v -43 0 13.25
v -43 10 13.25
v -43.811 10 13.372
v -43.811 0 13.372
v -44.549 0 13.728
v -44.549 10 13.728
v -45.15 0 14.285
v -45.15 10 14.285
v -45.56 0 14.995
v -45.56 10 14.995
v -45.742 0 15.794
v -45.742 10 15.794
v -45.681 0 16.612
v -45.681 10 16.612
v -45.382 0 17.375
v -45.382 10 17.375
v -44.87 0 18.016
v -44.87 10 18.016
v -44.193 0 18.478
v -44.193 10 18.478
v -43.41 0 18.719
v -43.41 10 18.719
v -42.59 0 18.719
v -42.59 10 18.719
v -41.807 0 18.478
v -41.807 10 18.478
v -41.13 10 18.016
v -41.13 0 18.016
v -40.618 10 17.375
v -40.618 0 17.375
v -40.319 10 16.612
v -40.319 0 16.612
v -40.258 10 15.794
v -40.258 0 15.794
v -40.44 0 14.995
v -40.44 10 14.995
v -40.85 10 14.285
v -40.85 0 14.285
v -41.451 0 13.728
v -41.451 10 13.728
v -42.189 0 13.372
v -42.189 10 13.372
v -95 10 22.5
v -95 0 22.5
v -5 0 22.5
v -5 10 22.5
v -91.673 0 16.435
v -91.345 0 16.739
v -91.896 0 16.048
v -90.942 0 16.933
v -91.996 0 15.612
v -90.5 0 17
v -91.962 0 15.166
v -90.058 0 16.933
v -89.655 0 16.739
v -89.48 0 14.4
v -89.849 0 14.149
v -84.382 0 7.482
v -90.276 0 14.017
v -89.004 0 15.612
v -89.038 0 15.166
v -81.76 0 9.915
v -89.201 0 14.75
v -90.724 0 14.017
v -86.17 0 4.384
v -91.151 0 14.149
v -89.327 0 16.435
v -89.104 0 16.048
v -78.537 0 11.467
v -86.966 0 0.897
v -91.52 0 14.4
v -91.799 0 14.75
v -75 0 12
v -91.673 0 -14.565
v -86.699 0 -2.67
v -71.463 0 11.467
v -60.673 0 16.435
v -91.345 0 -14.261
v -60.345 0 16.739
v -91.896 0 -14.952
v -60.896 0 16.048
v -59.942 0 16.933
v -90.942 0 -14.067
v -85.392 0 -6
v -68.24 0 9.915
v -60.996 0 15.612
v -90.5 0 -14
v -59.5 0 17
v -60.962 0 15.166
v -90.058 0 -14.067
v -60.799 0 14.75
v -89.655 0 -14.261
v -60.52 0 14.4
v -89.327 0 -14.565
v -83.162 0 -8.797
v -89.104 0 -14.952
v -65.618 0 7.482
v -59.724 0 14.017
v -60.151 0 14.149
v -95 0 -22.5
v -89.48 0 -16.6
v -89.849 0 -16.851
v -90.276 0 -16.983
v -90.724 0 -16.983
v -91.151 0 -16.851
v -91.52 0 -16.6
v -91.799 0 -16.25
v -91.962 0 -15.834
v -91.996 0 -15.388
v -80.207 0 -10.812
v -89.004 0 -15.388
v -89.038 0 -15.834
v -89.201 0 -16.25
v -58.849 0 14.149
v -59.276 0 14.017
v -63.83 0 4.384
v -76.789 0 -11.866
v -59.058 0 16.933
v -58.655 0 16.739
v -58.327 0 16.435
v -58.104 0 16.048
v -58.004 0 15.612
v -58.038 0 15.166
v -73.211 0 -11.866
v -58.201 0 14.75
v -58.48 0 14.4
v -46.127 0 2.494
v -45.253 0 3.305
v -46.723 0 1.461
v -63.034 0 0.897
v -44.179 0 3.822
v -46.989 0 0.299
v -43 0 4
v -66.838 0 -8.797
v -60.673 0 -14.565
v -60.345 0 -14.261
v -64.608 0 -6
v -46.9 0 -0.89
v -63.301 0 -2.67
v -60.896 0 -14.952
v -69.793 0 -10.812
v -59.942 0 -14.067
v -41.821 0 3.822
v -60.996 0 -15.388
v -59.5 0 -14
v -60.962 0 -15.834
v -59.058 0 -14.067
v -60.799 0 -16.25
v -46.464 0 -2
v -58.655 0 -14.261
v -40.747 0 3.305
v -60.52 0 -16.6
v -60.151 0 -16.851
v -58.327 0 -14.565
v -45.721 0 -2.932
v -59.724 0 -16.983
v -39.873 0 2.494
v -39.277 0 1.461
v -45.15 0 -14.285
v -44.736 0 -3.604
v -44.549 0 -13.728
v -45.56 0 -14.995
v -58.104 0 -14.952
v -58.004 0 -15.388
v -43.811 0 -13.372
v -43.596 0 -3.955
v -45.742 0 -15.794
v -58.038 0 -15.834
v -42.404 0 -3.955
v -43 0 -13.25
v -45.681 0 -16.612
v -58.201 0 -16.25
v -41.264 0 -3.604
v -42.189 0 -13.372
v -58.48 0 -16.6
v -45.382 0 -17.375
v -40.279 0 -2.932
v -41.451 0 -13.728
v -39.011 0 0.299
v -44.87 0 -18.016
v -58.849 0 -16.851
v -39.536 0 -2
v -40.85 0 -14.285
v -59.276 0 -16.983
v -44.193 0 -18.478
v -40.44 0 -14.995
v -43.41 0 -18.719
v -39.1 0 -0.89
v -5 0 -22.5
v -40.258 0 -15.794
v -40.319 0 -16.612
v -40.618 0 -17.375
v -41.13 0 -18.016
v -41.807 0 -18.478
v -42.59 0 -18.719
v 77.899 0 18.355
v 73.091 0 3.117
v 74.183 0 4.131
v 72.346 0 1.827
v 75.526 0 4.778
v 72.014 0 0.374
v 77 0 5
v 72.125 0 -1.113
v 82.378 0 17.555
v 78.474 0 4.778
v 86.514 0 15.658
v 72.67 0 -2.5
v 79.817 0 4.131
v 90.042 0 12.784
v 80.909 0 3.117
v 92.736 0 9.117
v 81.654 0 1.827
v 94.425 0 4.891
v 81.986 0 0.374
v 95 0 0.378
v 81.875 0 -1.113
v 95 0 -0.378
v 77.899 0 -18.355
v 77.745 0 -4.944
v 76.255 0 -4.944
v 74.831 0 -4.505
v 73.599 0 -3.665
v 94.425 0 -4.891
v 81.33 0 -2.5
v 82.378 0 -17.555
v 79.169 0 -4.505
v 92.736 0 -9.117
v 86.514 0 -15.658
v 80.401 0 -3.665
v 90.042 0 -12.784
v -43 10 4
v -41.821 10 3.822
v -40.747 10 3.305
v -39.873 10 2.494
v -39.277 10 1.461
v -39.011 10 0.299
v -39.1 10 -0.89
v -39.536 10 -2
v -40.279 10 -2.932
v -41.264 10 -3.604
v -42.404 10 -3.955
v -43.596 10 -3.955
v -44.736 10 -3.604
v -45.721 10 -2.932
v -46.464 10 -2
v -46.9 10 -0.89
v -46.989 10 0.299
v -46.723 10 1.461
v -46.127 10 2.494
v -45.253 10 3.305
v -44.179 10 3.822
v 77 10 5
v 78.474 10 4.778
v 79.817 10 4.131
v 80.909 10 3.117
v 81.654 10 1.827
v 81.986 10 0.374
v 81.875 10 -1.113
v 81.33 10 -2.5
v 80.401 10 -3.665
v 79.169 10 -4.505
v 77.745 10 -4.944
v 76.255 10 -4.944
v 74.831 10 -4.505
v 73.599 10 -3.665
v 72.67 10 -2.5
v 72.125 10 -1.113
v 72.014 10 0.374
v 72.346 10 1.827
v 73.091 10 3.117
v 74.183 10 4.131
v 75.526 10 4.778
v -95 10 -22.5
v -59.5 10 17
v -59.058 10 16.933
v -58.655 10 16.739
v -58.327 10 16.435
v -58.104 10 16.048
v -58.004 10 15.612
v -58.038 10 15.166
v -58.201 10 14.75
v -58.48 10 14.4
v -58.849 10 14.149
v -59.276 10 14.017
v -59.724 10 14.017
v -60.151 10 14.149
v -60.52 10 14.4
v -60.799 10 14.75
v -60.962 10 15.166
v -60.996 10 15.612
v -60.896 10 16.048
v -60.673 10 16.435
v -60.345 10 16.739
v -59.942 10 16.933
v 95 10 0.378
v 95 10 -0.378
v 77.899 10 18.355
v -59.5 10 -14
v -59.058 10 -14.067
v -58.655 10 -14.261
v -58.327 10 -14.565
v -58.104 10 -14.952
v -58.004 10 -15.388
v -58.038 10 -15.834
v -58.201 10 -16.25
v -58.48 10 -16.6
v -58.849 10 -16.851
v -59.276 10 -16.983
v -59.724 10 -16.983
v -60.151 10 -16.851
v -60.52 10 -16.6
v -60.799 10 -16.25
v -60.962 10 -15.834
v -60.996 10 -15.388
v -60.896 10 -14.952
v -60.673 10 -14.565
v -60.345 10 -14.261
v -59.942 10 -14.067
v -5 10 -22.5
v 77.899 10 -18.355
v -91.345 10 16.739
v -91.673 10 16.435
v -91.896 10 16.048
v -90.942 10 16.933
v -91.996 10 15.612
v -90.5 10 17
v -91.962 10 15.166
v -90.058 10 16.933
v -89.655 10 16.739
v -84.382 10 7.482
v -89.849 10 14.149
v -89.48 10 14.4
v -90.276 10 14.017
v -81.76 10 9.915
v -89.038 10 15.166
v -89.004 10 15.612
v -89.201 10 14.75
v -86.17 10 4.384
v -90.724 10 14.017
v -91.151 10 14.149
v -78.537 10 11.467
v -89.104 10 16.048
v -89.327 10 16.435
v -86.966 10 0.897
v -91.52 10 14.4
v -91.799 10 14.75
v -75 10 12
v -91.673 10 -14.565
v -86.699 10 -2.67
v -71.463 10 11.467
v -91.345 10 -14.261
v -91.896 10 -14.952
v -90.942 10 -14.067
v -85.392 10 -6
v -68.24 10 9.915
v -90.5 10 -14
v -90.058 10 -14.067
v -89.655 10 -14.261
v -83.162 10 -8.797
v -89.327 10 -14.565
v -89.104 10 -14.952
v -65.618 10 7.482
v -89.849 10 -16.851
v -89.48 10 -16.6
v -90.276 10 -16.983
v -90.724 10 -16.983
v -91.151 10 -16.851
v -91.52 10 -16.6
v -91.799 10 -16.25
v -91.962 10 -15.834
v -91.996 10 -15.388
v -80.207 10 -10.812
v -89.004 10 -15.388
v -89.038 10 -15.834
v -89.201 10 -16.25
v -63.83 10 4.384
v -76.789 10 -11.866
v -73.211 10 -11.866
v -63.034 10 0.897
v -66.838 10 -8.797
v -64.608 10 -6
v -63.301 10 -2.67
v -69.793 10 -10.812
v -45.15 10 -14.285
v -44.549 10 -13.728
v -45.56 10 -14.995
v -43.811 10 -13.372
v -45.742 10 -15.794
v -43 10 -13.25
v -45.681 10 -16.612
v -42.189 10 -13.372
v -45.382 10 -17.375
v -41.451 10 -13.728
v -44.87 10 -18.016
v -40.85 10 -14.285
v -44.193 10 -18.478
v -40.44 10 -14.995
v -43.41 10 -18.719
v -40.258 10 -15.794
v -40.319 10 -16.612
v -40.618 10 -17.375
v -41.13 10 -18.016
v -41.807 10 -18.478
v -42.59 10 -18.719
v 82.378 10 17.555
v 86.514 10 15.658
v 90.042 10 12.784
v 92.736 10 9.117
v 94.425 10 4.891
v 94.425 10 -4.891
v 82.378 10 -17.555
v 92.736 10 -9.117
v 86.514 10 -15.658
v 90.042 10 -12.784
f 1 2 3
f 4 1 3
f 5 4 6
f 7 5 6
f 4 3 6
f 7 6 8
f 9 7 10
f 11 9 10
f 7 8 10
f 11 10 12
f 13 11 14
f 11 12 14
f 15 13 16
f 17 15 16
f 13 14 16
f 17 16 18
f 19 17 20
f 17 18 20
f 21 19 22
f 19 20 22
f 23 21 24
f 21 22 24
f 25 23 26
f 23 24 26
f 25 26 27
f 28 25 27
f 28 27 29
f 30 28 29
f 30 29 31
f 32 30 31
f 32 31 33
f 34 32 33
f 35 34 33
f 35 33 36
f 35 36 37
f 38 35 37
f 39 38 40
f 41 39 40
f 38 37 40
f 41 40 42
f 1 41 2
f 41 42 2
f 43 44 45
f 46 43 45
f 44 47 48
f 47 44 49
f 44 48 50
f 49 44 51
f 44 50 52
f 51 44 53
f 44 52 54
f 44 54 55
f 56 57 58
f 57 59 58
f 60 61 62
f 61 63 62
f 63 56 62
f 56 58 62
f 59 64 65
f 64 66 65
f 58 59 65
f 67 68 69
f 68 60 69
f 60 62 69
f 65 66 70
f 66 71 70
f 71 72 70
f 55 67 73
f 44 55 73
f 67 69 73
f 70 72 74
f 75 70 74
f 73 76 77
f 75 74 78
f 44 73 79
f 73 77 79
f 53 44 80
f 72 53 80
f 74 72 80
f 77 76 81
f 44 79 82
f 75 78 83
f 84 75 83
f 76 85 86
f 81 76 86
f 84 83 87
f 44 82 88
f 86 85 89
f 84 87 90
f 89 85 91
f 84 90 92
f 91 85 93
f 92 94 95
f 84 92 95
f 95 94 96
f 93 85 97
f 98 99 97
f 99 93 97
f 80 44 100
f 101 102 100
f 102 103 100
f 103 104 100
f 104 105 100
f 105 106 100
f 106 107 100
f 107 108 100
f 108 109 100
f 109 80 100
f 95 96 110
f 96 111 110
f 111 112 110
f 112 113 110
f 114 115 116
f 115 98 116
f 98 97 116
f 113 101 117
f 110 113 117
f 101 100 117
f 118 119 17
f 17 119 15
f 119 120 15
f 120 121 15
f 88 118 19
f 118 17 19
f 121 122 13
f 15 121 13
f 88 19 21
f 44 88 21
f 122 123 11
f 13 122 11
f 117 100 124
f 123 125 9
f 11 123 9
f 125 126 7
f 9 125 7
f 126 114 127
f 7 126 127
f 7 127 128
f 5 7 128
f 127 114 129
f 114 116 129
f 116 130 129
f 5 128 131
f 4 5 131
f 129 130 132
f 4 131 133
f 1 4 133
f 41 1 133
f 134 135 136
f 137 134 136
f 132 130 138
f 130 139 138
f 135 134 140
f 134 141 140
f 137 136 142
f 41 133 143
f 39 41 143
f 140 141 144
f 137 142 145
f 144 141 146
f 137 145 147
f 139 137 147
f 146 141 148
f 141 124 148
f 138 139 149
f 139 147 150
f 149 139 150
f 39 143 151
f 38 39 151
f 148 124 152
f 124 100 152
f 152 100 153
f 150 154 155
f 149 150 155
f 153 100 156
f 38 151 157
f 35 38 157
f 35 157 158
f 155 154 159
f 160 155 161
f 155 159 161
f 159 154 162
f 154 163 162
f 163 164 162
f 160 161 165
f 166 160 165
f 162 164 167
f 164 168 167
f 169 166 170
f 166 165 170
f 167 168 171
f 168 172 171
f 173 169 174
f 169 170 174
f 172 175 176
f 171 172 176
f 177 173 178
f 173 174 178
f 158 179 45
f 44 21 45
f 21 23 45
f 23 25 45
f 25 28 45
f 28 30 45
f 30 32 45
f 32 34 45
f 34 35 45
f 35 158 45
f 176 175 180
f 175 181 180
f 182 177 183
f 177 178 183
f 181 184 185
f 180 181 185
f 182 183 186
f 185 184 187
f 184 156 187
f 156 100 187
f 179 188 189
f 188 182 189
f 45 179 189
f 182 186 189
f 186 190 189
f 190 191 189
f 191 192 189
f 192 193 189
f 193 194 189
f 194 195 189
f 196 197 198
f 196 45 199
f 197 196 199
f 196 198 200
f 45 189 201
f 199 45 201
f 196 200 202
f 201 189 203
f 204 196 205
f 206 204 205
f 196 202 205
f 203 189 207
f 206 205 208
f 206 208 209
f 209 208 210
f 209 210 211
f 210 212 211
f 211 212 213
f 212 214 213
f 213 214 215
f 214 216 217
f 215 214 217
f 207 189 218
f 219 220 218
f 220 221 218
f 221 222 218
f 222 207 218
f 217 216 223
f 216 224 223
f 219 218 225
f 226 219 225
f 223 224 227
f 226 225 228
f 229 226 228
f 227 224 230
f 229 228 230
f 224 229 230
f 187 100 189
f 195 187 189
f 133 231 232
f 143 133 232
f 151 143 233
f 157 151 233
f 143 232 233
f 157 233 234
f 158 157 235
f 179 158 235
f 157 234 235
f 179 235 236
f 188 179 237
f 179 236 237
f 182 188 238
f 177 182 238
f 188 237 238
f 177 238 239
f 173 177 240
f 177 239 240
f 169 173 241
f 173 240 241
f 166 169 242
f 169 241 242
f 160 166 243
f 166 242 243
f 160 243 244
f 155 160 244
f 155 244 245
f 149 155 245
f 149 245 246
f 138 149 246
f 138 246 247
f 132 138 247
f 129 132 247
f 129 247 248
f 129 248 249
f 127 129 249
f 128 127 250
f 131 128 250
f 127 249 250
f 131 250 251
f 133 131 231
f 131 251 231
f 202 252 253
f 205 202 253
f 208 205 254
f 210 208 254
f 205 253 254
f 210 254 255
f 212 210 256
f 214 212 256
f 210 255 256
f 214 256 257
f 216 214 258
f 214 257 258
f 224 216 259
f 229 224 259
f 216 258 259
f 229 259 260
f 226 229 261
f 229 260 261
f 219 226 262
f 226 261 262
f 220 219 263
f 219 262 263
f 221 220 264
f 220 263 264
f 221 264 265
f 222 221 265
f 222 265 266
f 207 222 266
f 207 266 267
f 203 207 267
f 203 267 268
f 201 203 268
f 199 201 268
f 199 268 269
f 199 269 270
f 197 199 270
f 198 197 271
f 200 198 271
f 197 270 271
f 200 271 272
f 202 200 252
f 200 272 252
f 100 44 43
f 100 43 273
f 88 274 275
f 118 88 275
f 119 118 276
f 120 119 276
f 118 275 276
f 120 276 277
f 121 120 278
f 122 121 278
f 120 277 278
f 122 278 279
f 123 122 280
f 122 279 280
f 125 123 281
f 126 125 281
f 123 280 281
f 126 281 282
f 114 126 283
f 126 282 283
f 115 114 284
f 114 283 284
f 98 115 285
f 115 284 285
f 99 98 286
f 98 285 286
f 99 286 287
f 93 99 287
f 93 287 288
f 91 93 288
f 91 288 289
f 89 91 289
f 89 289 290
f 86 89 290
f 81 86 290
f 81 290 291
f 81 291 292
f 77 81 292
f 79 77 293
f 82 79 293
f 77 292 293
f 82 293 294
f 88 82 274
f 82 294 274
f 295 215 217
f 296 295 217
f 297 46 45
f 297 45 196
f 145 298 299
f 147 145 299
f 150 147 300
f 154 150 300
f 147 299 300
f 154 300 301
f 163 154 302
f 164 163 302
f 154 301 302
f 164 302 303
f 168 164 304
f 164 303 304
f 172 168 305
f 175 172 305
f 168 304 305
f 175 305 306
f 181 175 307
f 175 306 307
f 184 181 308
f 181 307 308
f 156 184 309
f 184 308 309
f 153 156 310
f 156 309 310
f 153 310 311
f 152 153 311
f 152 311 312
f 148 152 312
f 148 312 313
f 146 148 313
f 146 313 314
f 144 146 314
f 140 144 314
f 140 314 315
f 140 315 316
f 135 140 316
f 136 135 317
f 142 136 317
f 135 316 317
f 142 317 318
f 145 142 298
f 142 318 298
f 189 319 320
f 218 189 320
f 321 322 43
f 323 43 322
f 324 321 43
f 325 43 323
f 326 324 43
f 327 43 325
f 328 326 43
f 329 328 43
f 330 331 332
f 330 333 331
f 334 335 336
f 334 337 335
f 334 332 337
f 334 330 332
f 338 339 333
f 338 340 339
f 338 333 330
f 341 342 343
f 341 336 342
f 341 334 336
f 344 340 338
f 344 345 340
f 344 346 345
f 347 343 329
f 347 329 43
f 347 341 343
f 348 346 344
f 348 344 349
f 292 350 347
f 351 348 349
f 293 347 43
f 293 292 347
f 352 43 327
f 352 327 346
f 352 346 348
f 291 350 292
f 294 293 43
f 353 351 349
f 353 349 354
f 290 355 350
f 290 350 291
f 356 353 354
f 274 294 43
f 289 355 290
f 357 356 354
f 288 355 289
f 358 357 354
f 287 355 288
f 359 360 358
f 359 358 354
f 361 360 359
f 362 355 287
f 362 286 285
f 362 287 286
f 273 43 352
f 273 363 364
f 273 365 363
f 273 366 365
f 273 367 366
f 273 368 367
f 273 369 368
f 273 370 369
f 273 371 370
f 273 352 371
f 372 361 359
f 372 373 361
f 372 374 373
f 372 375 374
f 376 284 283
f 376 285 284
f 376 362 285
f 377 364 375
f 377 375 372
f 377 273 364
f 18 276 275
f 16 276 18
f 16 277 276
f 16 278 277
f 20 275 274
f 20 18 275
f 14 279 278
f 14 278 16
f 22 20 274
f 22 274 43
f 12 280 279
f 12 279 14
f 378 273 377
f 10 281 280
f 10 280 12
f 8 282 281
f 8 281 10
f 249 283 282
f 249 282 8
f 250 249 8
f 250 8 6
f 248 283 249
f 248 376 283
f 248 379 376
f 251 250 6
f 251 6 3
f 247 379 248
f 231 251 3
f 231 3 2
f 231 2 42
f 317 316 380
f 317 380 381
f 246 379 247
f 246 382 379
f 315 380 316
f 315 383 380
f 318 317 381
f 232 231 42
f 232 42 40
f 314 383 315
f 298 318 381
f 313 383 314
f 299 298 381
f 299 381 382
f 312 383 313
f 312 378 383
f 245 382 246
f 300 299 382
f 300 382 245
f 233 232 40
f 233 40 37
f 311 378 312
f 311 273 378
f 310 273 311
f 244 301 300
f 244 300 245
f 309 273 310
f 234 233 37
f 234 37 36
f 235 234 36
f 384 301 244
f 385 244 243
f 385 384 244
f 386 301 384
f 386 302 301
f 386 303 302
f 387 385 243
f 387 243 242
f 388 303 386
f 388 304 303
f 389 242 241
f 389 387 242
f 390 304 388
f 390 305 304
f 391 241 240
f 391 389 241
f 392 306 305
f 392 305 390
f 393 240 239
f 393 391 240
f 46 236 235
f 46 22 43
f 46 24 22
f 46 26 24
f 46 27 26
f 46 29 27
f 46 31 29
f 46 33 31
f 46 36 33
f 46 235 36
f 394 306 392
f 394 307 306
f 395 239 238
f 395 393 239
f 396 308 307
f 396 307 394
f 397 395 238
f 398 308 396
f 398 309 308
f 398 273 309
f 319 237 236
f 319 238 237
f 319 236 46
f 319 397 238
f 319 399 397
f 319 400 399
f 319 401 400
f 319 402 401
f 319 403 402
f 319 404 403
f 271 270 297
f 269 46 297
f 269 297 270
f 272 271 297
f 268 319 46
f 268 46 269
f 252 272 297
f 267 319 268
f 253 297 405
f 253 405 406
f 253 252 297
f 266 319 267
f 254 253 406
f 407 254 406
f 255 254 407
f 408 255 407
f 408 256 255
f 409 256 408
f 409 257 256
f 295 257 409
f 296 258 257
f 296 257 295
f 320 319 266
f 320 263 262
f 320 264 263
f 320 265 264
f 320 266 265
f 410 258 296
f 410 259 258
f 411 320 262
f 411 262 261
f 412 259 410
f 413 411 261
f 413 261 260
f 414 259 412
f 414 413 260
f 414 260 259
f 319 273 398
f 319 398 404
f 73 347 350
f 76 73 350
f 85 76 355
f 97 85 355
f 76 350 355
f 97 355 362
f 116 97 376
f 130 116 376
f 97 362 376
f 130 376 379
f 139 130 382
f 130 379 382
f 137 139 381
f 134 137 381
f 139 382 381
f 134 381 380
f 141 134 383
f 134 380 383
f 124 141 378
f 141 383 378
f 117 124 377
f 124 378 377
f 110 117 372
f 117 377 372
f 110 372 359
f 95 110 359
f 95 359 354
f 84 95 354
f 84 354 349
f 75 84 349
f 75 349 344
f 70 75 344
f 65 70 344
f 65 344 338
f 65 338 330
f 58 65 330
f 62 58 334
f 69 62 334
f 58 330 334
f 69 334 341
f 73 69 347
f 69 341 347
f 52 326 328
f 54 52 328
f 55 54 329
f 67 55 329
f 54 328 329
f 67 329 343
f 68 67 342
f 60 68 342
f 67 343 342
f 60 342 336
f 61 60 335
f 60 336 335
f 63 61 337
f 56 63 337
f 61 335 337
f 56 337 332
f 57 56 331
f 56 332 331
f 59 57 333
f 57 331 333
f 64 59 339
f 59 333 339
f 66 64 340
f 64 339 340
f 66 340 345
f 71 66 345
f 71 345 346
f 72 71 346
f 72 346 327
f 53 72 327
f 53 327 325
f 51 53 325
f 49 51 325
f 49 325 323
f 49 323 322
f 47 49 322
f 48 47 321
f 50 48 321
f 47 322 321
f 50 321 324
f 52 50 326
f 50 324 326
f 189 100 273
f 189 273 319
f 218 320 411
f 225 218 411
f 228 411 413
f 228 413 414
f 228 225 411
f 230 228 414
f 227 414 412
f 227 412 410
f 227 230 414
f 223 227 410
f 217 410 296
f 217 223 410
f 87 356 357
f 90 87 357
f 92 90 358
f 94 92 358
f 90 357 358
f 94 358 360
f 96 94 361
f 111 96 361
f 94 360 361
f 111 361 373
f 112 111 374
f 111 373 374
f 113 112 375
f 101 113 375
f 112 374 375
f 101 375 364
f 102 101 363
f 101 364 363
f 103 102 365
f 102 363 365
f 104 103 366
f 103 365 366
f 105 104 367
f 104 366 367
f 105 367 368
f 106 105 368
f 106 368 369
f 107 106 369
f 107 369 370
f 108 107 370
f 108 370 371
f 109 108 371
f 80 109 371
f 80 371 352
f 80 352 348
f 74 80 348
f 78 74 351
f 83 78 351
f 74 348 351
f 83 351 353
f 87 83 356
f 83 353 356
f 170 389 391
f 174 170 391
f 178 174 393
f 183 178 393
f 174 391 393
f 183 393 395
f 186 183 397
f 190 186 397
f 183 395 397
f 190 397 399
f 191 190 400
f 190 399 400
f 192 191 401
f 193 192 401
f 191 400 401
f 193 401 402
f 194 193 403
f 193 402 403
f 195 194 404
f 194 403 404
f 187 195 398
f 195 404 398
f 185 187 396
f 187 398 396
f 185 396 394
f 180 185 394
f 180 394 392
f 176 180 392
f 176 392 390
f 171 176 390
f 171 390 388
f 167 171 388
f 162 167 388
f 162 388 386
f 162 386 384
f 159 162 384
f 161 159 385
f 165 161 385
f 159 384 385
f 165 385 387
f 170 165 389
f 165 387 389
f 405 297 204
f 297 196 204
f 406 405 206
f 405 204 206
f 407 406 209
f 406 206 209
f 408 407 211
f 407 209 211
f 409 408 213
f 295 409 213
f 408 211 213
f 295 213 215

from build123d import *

# Parameters (mm, degrees)
SKETCH1_W           = 190
SKETCH1_H           = 45
BOSS_EXTRUDE1_DEPTH = 10
SKETCH2_R           = 1.5
SKETCH2_R_2         = 12
SKETCH2_R_3         = 4
SKETCH2_R_4         = 2.75
SKETCH2_R_5         = 5
CUT_EXTRUDE1_DEPTH  = 10
CUT_EXTRUDE2_DEPTH  = 10
FILLET1_R           = 18


with BuildPart() as part:
    # Sketch1 → Boss-Extrude1 (new body)
    with BuildSketch(Plane(origin=(0, 0, 0), x_dir=(1, 0, 0), z_dir=(0, 1, 0))):
        Rectangle(SKETCH1_W, SKETCH1_H)
    extrude(amount=BOSS_EXTRUDE1_DEPTH)

    # Sketch2 → Cut-Extrude1 (cut)
    with BuildSketch(Plane(origin=(0, 10, 0), x_dir=(1, 0, 0), z_dir=(0, 1, 0))):
        with Locations(Location((-90.5, 15.5, 0), (0, 0, 270))):
            Circle(SKETCH2_R)
        with Locations(Location((-59.5, 15.5, 0), (0, 0, 270))):
            Circle(SKETCH2_R)
        with Locations(Location((-90.5, -15.5, 0), (0, 0, 270))):
            Circle(SKETCH2_R)
        with Locations(Location((-59.5, -15.5, 0), (0, 0, 270))):
            Circle(SKETCH2_R)
        with Locations(Location((-75, 0, 0), (0, 0, 270))):
            Circle(SKETCH2_R_2)
        with Locations(Location((-43, 0, 0), (0, 0, 270))):
            Circle(SKETCH2_R_3)
        with Locations(Location((-43, 16, 0), (0, 0, 270))):
            Circle(SKETCH2_R_4)
        with Locations(Location((-43, -16, 0), (0, 0, 90))):
            Circle(SKETCH2_R_4)
        with Locations(Location((77, 0, 0), (0, 0, 270))):
            Circle(SKETCH2_R_5)
    extrude(amount=-CUT_EXTRUDE1_DEPTH, mode=Mode.SUBTRACT)

    # Sketch3 → Cut-Extrude2 (cut)
    with BuildSketch(Plane(origin=(0, 10, 0), x_dir=(1, 0, 0), z_dir=(0, 1, 0))):
        Polygon((95, -22.5), (-5, -22.5), (95, -17.5), align=None)
        Polygon((-5, 22.5), (95, 17.5), (95, 22.5), align=None)
    extrude(amount=-CUT_EXTRUDE2_DEPTH, mode=Mode.SUBTRACT)

    # Fillet1
    fillet1_edges = [part.edges().sort_by_distance(p)[0] for p in [
        (95, 5, 17.5),
        (95, 5, -17.5),
    ]]
    fillet(fillet1_edges, radius=FILLET1_R)


solid = part.part
